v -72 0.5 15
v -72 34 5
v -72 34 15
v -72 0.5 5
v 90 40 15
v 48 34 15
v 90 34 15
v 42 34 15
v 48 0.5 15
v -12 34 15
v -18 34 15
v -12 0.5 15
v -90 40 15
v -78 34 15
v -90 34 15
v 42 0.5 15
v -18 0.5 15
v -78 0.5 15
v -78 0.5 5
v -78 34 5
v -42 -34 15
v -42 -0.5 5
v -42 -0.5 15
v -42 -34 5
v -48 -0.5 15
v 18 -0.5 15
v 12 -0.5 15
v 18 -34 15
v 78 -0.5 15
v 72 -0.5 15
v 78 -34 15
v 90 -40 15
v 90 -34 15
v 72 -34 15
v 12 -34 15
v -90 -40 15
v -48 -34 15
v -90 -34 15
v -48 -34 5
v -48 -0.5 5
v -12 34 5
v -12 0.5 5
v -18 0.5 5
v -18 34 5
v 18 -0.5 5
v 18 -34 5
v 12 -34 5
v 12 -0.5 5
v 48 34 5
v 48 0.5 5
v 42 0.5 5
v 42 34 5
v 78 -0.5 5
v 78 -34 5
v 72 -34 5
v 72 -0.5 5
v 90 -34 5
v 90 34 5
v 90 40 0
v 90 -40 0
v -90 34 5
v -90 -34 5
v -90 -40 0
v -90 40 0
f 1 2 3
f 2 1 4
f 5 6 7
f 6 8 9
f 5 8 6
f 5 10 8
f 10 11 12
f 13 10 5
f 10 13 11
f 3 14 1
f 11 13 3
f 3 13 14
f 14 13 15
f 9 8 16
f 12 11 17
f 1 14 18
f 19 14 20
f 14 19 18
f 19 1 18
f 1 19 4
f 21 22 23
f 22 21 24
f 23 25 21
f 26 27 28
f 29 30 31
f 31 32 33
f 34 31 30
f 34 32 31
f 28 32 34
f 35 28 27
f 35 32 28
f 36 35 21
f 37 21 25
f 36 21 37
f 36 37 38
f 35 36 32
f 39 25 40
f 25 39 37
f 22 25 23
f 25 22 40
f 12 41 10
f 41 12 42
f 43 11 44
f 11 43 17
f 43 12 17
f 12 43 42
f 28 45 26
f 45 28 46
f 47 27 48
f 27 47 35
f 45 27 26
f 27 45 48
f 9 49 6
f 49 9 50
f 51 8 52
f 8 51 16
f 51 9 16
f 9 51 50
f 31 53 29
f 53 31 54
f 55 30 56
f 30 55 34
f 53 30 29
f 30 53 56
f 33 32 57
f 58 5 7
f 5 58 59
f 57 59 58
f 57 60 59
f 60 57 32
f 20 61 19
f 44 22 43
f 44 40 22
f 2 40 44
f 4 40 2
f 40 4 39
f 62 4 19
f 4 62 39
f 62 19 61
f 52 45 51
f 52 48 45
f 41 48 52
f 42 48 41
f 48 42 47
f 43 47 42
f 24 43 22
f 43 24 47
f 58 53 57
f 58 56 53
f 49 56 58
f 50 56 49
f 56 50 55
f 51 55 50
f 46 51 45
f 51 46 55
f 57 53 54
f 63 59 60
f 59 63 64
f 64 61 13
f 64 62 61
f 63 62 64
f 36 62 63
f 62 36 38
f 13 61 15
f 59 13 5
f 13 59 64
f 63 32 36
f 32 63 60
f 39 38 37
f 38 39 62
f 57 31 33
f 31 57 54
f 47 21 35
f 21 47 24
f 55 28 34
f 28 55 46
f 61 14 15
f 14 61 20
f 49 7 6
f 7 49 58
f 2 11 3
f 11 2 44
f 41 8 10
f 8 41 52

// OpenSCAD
$fn = 32;

// ----------------------------------------------------------------------
// Rib frame 180 x 80 x 15
// 6 ribs at 30 mm pitch, staggered
// ----------------------------------------------------------------------

// --- parameters (mm) ---
frame = [180, 80, 5];  // base plate size (x, y, z)
rail_w = 6;            // side rail width
ribs = 6;              // number of ribs
rib_t = 6;             // rib thickness
rib_h = 10;            // rib height above the base plate
pitch = 30;            // pitch between rib centres

// --- derived feature positions (mm) ---
span = (ribs - 1) * pitch;          // = 150   distance between the outer ribs
origin_x = -span / 2;               // = -75   X of the first rib
rib_len = frame[1] / 2 - rail_w + 0.5;  // = 34.5   length of a staggered rib
rib_y = 0.5 + rib_len / 2;          // = 17.75   Y of a staggered rib centre
row_offset = 2 * rib_y;             // = 35.5   distance between the two rows
feature_centers = [
  [origin_x + 0 * pitch, rib_y],
  [origin_x + 1 * pitch, -rib_y],
  [origin_x + 2 * pitch, rib_y],
  [origin_x + 3 * pitch, -rib_y],
  [origin_x + 4 * pitch, rib_y],
  [origin_x + 5 * pitch, -rib_y]
];   // rib centre line, drives the rib loop

// base plate, two side rails, then the ribs read straight off feature_centers
union() {
  translate([-frame[0] / 2, -frame[1] / 2, 0]) cube(frame);
  translate([-frame[0] / 2, -frame[1] / 2, 0]) cube([frame[0], rail_w, frame[2] + rib_h]);
  translate([-frame[0] / 2, frame[1] / 2 - rail_w, 0]) cube([frame[0], rail_w, frame[2] + rib_h]);
  for (centre = feature_centers)
    translate([centre[0] - rib_t / 2, centre[1] - rib_len / 2, frame[2] - 1])
      cube([rib_t, rib_len, rib_h + 1]);
}
